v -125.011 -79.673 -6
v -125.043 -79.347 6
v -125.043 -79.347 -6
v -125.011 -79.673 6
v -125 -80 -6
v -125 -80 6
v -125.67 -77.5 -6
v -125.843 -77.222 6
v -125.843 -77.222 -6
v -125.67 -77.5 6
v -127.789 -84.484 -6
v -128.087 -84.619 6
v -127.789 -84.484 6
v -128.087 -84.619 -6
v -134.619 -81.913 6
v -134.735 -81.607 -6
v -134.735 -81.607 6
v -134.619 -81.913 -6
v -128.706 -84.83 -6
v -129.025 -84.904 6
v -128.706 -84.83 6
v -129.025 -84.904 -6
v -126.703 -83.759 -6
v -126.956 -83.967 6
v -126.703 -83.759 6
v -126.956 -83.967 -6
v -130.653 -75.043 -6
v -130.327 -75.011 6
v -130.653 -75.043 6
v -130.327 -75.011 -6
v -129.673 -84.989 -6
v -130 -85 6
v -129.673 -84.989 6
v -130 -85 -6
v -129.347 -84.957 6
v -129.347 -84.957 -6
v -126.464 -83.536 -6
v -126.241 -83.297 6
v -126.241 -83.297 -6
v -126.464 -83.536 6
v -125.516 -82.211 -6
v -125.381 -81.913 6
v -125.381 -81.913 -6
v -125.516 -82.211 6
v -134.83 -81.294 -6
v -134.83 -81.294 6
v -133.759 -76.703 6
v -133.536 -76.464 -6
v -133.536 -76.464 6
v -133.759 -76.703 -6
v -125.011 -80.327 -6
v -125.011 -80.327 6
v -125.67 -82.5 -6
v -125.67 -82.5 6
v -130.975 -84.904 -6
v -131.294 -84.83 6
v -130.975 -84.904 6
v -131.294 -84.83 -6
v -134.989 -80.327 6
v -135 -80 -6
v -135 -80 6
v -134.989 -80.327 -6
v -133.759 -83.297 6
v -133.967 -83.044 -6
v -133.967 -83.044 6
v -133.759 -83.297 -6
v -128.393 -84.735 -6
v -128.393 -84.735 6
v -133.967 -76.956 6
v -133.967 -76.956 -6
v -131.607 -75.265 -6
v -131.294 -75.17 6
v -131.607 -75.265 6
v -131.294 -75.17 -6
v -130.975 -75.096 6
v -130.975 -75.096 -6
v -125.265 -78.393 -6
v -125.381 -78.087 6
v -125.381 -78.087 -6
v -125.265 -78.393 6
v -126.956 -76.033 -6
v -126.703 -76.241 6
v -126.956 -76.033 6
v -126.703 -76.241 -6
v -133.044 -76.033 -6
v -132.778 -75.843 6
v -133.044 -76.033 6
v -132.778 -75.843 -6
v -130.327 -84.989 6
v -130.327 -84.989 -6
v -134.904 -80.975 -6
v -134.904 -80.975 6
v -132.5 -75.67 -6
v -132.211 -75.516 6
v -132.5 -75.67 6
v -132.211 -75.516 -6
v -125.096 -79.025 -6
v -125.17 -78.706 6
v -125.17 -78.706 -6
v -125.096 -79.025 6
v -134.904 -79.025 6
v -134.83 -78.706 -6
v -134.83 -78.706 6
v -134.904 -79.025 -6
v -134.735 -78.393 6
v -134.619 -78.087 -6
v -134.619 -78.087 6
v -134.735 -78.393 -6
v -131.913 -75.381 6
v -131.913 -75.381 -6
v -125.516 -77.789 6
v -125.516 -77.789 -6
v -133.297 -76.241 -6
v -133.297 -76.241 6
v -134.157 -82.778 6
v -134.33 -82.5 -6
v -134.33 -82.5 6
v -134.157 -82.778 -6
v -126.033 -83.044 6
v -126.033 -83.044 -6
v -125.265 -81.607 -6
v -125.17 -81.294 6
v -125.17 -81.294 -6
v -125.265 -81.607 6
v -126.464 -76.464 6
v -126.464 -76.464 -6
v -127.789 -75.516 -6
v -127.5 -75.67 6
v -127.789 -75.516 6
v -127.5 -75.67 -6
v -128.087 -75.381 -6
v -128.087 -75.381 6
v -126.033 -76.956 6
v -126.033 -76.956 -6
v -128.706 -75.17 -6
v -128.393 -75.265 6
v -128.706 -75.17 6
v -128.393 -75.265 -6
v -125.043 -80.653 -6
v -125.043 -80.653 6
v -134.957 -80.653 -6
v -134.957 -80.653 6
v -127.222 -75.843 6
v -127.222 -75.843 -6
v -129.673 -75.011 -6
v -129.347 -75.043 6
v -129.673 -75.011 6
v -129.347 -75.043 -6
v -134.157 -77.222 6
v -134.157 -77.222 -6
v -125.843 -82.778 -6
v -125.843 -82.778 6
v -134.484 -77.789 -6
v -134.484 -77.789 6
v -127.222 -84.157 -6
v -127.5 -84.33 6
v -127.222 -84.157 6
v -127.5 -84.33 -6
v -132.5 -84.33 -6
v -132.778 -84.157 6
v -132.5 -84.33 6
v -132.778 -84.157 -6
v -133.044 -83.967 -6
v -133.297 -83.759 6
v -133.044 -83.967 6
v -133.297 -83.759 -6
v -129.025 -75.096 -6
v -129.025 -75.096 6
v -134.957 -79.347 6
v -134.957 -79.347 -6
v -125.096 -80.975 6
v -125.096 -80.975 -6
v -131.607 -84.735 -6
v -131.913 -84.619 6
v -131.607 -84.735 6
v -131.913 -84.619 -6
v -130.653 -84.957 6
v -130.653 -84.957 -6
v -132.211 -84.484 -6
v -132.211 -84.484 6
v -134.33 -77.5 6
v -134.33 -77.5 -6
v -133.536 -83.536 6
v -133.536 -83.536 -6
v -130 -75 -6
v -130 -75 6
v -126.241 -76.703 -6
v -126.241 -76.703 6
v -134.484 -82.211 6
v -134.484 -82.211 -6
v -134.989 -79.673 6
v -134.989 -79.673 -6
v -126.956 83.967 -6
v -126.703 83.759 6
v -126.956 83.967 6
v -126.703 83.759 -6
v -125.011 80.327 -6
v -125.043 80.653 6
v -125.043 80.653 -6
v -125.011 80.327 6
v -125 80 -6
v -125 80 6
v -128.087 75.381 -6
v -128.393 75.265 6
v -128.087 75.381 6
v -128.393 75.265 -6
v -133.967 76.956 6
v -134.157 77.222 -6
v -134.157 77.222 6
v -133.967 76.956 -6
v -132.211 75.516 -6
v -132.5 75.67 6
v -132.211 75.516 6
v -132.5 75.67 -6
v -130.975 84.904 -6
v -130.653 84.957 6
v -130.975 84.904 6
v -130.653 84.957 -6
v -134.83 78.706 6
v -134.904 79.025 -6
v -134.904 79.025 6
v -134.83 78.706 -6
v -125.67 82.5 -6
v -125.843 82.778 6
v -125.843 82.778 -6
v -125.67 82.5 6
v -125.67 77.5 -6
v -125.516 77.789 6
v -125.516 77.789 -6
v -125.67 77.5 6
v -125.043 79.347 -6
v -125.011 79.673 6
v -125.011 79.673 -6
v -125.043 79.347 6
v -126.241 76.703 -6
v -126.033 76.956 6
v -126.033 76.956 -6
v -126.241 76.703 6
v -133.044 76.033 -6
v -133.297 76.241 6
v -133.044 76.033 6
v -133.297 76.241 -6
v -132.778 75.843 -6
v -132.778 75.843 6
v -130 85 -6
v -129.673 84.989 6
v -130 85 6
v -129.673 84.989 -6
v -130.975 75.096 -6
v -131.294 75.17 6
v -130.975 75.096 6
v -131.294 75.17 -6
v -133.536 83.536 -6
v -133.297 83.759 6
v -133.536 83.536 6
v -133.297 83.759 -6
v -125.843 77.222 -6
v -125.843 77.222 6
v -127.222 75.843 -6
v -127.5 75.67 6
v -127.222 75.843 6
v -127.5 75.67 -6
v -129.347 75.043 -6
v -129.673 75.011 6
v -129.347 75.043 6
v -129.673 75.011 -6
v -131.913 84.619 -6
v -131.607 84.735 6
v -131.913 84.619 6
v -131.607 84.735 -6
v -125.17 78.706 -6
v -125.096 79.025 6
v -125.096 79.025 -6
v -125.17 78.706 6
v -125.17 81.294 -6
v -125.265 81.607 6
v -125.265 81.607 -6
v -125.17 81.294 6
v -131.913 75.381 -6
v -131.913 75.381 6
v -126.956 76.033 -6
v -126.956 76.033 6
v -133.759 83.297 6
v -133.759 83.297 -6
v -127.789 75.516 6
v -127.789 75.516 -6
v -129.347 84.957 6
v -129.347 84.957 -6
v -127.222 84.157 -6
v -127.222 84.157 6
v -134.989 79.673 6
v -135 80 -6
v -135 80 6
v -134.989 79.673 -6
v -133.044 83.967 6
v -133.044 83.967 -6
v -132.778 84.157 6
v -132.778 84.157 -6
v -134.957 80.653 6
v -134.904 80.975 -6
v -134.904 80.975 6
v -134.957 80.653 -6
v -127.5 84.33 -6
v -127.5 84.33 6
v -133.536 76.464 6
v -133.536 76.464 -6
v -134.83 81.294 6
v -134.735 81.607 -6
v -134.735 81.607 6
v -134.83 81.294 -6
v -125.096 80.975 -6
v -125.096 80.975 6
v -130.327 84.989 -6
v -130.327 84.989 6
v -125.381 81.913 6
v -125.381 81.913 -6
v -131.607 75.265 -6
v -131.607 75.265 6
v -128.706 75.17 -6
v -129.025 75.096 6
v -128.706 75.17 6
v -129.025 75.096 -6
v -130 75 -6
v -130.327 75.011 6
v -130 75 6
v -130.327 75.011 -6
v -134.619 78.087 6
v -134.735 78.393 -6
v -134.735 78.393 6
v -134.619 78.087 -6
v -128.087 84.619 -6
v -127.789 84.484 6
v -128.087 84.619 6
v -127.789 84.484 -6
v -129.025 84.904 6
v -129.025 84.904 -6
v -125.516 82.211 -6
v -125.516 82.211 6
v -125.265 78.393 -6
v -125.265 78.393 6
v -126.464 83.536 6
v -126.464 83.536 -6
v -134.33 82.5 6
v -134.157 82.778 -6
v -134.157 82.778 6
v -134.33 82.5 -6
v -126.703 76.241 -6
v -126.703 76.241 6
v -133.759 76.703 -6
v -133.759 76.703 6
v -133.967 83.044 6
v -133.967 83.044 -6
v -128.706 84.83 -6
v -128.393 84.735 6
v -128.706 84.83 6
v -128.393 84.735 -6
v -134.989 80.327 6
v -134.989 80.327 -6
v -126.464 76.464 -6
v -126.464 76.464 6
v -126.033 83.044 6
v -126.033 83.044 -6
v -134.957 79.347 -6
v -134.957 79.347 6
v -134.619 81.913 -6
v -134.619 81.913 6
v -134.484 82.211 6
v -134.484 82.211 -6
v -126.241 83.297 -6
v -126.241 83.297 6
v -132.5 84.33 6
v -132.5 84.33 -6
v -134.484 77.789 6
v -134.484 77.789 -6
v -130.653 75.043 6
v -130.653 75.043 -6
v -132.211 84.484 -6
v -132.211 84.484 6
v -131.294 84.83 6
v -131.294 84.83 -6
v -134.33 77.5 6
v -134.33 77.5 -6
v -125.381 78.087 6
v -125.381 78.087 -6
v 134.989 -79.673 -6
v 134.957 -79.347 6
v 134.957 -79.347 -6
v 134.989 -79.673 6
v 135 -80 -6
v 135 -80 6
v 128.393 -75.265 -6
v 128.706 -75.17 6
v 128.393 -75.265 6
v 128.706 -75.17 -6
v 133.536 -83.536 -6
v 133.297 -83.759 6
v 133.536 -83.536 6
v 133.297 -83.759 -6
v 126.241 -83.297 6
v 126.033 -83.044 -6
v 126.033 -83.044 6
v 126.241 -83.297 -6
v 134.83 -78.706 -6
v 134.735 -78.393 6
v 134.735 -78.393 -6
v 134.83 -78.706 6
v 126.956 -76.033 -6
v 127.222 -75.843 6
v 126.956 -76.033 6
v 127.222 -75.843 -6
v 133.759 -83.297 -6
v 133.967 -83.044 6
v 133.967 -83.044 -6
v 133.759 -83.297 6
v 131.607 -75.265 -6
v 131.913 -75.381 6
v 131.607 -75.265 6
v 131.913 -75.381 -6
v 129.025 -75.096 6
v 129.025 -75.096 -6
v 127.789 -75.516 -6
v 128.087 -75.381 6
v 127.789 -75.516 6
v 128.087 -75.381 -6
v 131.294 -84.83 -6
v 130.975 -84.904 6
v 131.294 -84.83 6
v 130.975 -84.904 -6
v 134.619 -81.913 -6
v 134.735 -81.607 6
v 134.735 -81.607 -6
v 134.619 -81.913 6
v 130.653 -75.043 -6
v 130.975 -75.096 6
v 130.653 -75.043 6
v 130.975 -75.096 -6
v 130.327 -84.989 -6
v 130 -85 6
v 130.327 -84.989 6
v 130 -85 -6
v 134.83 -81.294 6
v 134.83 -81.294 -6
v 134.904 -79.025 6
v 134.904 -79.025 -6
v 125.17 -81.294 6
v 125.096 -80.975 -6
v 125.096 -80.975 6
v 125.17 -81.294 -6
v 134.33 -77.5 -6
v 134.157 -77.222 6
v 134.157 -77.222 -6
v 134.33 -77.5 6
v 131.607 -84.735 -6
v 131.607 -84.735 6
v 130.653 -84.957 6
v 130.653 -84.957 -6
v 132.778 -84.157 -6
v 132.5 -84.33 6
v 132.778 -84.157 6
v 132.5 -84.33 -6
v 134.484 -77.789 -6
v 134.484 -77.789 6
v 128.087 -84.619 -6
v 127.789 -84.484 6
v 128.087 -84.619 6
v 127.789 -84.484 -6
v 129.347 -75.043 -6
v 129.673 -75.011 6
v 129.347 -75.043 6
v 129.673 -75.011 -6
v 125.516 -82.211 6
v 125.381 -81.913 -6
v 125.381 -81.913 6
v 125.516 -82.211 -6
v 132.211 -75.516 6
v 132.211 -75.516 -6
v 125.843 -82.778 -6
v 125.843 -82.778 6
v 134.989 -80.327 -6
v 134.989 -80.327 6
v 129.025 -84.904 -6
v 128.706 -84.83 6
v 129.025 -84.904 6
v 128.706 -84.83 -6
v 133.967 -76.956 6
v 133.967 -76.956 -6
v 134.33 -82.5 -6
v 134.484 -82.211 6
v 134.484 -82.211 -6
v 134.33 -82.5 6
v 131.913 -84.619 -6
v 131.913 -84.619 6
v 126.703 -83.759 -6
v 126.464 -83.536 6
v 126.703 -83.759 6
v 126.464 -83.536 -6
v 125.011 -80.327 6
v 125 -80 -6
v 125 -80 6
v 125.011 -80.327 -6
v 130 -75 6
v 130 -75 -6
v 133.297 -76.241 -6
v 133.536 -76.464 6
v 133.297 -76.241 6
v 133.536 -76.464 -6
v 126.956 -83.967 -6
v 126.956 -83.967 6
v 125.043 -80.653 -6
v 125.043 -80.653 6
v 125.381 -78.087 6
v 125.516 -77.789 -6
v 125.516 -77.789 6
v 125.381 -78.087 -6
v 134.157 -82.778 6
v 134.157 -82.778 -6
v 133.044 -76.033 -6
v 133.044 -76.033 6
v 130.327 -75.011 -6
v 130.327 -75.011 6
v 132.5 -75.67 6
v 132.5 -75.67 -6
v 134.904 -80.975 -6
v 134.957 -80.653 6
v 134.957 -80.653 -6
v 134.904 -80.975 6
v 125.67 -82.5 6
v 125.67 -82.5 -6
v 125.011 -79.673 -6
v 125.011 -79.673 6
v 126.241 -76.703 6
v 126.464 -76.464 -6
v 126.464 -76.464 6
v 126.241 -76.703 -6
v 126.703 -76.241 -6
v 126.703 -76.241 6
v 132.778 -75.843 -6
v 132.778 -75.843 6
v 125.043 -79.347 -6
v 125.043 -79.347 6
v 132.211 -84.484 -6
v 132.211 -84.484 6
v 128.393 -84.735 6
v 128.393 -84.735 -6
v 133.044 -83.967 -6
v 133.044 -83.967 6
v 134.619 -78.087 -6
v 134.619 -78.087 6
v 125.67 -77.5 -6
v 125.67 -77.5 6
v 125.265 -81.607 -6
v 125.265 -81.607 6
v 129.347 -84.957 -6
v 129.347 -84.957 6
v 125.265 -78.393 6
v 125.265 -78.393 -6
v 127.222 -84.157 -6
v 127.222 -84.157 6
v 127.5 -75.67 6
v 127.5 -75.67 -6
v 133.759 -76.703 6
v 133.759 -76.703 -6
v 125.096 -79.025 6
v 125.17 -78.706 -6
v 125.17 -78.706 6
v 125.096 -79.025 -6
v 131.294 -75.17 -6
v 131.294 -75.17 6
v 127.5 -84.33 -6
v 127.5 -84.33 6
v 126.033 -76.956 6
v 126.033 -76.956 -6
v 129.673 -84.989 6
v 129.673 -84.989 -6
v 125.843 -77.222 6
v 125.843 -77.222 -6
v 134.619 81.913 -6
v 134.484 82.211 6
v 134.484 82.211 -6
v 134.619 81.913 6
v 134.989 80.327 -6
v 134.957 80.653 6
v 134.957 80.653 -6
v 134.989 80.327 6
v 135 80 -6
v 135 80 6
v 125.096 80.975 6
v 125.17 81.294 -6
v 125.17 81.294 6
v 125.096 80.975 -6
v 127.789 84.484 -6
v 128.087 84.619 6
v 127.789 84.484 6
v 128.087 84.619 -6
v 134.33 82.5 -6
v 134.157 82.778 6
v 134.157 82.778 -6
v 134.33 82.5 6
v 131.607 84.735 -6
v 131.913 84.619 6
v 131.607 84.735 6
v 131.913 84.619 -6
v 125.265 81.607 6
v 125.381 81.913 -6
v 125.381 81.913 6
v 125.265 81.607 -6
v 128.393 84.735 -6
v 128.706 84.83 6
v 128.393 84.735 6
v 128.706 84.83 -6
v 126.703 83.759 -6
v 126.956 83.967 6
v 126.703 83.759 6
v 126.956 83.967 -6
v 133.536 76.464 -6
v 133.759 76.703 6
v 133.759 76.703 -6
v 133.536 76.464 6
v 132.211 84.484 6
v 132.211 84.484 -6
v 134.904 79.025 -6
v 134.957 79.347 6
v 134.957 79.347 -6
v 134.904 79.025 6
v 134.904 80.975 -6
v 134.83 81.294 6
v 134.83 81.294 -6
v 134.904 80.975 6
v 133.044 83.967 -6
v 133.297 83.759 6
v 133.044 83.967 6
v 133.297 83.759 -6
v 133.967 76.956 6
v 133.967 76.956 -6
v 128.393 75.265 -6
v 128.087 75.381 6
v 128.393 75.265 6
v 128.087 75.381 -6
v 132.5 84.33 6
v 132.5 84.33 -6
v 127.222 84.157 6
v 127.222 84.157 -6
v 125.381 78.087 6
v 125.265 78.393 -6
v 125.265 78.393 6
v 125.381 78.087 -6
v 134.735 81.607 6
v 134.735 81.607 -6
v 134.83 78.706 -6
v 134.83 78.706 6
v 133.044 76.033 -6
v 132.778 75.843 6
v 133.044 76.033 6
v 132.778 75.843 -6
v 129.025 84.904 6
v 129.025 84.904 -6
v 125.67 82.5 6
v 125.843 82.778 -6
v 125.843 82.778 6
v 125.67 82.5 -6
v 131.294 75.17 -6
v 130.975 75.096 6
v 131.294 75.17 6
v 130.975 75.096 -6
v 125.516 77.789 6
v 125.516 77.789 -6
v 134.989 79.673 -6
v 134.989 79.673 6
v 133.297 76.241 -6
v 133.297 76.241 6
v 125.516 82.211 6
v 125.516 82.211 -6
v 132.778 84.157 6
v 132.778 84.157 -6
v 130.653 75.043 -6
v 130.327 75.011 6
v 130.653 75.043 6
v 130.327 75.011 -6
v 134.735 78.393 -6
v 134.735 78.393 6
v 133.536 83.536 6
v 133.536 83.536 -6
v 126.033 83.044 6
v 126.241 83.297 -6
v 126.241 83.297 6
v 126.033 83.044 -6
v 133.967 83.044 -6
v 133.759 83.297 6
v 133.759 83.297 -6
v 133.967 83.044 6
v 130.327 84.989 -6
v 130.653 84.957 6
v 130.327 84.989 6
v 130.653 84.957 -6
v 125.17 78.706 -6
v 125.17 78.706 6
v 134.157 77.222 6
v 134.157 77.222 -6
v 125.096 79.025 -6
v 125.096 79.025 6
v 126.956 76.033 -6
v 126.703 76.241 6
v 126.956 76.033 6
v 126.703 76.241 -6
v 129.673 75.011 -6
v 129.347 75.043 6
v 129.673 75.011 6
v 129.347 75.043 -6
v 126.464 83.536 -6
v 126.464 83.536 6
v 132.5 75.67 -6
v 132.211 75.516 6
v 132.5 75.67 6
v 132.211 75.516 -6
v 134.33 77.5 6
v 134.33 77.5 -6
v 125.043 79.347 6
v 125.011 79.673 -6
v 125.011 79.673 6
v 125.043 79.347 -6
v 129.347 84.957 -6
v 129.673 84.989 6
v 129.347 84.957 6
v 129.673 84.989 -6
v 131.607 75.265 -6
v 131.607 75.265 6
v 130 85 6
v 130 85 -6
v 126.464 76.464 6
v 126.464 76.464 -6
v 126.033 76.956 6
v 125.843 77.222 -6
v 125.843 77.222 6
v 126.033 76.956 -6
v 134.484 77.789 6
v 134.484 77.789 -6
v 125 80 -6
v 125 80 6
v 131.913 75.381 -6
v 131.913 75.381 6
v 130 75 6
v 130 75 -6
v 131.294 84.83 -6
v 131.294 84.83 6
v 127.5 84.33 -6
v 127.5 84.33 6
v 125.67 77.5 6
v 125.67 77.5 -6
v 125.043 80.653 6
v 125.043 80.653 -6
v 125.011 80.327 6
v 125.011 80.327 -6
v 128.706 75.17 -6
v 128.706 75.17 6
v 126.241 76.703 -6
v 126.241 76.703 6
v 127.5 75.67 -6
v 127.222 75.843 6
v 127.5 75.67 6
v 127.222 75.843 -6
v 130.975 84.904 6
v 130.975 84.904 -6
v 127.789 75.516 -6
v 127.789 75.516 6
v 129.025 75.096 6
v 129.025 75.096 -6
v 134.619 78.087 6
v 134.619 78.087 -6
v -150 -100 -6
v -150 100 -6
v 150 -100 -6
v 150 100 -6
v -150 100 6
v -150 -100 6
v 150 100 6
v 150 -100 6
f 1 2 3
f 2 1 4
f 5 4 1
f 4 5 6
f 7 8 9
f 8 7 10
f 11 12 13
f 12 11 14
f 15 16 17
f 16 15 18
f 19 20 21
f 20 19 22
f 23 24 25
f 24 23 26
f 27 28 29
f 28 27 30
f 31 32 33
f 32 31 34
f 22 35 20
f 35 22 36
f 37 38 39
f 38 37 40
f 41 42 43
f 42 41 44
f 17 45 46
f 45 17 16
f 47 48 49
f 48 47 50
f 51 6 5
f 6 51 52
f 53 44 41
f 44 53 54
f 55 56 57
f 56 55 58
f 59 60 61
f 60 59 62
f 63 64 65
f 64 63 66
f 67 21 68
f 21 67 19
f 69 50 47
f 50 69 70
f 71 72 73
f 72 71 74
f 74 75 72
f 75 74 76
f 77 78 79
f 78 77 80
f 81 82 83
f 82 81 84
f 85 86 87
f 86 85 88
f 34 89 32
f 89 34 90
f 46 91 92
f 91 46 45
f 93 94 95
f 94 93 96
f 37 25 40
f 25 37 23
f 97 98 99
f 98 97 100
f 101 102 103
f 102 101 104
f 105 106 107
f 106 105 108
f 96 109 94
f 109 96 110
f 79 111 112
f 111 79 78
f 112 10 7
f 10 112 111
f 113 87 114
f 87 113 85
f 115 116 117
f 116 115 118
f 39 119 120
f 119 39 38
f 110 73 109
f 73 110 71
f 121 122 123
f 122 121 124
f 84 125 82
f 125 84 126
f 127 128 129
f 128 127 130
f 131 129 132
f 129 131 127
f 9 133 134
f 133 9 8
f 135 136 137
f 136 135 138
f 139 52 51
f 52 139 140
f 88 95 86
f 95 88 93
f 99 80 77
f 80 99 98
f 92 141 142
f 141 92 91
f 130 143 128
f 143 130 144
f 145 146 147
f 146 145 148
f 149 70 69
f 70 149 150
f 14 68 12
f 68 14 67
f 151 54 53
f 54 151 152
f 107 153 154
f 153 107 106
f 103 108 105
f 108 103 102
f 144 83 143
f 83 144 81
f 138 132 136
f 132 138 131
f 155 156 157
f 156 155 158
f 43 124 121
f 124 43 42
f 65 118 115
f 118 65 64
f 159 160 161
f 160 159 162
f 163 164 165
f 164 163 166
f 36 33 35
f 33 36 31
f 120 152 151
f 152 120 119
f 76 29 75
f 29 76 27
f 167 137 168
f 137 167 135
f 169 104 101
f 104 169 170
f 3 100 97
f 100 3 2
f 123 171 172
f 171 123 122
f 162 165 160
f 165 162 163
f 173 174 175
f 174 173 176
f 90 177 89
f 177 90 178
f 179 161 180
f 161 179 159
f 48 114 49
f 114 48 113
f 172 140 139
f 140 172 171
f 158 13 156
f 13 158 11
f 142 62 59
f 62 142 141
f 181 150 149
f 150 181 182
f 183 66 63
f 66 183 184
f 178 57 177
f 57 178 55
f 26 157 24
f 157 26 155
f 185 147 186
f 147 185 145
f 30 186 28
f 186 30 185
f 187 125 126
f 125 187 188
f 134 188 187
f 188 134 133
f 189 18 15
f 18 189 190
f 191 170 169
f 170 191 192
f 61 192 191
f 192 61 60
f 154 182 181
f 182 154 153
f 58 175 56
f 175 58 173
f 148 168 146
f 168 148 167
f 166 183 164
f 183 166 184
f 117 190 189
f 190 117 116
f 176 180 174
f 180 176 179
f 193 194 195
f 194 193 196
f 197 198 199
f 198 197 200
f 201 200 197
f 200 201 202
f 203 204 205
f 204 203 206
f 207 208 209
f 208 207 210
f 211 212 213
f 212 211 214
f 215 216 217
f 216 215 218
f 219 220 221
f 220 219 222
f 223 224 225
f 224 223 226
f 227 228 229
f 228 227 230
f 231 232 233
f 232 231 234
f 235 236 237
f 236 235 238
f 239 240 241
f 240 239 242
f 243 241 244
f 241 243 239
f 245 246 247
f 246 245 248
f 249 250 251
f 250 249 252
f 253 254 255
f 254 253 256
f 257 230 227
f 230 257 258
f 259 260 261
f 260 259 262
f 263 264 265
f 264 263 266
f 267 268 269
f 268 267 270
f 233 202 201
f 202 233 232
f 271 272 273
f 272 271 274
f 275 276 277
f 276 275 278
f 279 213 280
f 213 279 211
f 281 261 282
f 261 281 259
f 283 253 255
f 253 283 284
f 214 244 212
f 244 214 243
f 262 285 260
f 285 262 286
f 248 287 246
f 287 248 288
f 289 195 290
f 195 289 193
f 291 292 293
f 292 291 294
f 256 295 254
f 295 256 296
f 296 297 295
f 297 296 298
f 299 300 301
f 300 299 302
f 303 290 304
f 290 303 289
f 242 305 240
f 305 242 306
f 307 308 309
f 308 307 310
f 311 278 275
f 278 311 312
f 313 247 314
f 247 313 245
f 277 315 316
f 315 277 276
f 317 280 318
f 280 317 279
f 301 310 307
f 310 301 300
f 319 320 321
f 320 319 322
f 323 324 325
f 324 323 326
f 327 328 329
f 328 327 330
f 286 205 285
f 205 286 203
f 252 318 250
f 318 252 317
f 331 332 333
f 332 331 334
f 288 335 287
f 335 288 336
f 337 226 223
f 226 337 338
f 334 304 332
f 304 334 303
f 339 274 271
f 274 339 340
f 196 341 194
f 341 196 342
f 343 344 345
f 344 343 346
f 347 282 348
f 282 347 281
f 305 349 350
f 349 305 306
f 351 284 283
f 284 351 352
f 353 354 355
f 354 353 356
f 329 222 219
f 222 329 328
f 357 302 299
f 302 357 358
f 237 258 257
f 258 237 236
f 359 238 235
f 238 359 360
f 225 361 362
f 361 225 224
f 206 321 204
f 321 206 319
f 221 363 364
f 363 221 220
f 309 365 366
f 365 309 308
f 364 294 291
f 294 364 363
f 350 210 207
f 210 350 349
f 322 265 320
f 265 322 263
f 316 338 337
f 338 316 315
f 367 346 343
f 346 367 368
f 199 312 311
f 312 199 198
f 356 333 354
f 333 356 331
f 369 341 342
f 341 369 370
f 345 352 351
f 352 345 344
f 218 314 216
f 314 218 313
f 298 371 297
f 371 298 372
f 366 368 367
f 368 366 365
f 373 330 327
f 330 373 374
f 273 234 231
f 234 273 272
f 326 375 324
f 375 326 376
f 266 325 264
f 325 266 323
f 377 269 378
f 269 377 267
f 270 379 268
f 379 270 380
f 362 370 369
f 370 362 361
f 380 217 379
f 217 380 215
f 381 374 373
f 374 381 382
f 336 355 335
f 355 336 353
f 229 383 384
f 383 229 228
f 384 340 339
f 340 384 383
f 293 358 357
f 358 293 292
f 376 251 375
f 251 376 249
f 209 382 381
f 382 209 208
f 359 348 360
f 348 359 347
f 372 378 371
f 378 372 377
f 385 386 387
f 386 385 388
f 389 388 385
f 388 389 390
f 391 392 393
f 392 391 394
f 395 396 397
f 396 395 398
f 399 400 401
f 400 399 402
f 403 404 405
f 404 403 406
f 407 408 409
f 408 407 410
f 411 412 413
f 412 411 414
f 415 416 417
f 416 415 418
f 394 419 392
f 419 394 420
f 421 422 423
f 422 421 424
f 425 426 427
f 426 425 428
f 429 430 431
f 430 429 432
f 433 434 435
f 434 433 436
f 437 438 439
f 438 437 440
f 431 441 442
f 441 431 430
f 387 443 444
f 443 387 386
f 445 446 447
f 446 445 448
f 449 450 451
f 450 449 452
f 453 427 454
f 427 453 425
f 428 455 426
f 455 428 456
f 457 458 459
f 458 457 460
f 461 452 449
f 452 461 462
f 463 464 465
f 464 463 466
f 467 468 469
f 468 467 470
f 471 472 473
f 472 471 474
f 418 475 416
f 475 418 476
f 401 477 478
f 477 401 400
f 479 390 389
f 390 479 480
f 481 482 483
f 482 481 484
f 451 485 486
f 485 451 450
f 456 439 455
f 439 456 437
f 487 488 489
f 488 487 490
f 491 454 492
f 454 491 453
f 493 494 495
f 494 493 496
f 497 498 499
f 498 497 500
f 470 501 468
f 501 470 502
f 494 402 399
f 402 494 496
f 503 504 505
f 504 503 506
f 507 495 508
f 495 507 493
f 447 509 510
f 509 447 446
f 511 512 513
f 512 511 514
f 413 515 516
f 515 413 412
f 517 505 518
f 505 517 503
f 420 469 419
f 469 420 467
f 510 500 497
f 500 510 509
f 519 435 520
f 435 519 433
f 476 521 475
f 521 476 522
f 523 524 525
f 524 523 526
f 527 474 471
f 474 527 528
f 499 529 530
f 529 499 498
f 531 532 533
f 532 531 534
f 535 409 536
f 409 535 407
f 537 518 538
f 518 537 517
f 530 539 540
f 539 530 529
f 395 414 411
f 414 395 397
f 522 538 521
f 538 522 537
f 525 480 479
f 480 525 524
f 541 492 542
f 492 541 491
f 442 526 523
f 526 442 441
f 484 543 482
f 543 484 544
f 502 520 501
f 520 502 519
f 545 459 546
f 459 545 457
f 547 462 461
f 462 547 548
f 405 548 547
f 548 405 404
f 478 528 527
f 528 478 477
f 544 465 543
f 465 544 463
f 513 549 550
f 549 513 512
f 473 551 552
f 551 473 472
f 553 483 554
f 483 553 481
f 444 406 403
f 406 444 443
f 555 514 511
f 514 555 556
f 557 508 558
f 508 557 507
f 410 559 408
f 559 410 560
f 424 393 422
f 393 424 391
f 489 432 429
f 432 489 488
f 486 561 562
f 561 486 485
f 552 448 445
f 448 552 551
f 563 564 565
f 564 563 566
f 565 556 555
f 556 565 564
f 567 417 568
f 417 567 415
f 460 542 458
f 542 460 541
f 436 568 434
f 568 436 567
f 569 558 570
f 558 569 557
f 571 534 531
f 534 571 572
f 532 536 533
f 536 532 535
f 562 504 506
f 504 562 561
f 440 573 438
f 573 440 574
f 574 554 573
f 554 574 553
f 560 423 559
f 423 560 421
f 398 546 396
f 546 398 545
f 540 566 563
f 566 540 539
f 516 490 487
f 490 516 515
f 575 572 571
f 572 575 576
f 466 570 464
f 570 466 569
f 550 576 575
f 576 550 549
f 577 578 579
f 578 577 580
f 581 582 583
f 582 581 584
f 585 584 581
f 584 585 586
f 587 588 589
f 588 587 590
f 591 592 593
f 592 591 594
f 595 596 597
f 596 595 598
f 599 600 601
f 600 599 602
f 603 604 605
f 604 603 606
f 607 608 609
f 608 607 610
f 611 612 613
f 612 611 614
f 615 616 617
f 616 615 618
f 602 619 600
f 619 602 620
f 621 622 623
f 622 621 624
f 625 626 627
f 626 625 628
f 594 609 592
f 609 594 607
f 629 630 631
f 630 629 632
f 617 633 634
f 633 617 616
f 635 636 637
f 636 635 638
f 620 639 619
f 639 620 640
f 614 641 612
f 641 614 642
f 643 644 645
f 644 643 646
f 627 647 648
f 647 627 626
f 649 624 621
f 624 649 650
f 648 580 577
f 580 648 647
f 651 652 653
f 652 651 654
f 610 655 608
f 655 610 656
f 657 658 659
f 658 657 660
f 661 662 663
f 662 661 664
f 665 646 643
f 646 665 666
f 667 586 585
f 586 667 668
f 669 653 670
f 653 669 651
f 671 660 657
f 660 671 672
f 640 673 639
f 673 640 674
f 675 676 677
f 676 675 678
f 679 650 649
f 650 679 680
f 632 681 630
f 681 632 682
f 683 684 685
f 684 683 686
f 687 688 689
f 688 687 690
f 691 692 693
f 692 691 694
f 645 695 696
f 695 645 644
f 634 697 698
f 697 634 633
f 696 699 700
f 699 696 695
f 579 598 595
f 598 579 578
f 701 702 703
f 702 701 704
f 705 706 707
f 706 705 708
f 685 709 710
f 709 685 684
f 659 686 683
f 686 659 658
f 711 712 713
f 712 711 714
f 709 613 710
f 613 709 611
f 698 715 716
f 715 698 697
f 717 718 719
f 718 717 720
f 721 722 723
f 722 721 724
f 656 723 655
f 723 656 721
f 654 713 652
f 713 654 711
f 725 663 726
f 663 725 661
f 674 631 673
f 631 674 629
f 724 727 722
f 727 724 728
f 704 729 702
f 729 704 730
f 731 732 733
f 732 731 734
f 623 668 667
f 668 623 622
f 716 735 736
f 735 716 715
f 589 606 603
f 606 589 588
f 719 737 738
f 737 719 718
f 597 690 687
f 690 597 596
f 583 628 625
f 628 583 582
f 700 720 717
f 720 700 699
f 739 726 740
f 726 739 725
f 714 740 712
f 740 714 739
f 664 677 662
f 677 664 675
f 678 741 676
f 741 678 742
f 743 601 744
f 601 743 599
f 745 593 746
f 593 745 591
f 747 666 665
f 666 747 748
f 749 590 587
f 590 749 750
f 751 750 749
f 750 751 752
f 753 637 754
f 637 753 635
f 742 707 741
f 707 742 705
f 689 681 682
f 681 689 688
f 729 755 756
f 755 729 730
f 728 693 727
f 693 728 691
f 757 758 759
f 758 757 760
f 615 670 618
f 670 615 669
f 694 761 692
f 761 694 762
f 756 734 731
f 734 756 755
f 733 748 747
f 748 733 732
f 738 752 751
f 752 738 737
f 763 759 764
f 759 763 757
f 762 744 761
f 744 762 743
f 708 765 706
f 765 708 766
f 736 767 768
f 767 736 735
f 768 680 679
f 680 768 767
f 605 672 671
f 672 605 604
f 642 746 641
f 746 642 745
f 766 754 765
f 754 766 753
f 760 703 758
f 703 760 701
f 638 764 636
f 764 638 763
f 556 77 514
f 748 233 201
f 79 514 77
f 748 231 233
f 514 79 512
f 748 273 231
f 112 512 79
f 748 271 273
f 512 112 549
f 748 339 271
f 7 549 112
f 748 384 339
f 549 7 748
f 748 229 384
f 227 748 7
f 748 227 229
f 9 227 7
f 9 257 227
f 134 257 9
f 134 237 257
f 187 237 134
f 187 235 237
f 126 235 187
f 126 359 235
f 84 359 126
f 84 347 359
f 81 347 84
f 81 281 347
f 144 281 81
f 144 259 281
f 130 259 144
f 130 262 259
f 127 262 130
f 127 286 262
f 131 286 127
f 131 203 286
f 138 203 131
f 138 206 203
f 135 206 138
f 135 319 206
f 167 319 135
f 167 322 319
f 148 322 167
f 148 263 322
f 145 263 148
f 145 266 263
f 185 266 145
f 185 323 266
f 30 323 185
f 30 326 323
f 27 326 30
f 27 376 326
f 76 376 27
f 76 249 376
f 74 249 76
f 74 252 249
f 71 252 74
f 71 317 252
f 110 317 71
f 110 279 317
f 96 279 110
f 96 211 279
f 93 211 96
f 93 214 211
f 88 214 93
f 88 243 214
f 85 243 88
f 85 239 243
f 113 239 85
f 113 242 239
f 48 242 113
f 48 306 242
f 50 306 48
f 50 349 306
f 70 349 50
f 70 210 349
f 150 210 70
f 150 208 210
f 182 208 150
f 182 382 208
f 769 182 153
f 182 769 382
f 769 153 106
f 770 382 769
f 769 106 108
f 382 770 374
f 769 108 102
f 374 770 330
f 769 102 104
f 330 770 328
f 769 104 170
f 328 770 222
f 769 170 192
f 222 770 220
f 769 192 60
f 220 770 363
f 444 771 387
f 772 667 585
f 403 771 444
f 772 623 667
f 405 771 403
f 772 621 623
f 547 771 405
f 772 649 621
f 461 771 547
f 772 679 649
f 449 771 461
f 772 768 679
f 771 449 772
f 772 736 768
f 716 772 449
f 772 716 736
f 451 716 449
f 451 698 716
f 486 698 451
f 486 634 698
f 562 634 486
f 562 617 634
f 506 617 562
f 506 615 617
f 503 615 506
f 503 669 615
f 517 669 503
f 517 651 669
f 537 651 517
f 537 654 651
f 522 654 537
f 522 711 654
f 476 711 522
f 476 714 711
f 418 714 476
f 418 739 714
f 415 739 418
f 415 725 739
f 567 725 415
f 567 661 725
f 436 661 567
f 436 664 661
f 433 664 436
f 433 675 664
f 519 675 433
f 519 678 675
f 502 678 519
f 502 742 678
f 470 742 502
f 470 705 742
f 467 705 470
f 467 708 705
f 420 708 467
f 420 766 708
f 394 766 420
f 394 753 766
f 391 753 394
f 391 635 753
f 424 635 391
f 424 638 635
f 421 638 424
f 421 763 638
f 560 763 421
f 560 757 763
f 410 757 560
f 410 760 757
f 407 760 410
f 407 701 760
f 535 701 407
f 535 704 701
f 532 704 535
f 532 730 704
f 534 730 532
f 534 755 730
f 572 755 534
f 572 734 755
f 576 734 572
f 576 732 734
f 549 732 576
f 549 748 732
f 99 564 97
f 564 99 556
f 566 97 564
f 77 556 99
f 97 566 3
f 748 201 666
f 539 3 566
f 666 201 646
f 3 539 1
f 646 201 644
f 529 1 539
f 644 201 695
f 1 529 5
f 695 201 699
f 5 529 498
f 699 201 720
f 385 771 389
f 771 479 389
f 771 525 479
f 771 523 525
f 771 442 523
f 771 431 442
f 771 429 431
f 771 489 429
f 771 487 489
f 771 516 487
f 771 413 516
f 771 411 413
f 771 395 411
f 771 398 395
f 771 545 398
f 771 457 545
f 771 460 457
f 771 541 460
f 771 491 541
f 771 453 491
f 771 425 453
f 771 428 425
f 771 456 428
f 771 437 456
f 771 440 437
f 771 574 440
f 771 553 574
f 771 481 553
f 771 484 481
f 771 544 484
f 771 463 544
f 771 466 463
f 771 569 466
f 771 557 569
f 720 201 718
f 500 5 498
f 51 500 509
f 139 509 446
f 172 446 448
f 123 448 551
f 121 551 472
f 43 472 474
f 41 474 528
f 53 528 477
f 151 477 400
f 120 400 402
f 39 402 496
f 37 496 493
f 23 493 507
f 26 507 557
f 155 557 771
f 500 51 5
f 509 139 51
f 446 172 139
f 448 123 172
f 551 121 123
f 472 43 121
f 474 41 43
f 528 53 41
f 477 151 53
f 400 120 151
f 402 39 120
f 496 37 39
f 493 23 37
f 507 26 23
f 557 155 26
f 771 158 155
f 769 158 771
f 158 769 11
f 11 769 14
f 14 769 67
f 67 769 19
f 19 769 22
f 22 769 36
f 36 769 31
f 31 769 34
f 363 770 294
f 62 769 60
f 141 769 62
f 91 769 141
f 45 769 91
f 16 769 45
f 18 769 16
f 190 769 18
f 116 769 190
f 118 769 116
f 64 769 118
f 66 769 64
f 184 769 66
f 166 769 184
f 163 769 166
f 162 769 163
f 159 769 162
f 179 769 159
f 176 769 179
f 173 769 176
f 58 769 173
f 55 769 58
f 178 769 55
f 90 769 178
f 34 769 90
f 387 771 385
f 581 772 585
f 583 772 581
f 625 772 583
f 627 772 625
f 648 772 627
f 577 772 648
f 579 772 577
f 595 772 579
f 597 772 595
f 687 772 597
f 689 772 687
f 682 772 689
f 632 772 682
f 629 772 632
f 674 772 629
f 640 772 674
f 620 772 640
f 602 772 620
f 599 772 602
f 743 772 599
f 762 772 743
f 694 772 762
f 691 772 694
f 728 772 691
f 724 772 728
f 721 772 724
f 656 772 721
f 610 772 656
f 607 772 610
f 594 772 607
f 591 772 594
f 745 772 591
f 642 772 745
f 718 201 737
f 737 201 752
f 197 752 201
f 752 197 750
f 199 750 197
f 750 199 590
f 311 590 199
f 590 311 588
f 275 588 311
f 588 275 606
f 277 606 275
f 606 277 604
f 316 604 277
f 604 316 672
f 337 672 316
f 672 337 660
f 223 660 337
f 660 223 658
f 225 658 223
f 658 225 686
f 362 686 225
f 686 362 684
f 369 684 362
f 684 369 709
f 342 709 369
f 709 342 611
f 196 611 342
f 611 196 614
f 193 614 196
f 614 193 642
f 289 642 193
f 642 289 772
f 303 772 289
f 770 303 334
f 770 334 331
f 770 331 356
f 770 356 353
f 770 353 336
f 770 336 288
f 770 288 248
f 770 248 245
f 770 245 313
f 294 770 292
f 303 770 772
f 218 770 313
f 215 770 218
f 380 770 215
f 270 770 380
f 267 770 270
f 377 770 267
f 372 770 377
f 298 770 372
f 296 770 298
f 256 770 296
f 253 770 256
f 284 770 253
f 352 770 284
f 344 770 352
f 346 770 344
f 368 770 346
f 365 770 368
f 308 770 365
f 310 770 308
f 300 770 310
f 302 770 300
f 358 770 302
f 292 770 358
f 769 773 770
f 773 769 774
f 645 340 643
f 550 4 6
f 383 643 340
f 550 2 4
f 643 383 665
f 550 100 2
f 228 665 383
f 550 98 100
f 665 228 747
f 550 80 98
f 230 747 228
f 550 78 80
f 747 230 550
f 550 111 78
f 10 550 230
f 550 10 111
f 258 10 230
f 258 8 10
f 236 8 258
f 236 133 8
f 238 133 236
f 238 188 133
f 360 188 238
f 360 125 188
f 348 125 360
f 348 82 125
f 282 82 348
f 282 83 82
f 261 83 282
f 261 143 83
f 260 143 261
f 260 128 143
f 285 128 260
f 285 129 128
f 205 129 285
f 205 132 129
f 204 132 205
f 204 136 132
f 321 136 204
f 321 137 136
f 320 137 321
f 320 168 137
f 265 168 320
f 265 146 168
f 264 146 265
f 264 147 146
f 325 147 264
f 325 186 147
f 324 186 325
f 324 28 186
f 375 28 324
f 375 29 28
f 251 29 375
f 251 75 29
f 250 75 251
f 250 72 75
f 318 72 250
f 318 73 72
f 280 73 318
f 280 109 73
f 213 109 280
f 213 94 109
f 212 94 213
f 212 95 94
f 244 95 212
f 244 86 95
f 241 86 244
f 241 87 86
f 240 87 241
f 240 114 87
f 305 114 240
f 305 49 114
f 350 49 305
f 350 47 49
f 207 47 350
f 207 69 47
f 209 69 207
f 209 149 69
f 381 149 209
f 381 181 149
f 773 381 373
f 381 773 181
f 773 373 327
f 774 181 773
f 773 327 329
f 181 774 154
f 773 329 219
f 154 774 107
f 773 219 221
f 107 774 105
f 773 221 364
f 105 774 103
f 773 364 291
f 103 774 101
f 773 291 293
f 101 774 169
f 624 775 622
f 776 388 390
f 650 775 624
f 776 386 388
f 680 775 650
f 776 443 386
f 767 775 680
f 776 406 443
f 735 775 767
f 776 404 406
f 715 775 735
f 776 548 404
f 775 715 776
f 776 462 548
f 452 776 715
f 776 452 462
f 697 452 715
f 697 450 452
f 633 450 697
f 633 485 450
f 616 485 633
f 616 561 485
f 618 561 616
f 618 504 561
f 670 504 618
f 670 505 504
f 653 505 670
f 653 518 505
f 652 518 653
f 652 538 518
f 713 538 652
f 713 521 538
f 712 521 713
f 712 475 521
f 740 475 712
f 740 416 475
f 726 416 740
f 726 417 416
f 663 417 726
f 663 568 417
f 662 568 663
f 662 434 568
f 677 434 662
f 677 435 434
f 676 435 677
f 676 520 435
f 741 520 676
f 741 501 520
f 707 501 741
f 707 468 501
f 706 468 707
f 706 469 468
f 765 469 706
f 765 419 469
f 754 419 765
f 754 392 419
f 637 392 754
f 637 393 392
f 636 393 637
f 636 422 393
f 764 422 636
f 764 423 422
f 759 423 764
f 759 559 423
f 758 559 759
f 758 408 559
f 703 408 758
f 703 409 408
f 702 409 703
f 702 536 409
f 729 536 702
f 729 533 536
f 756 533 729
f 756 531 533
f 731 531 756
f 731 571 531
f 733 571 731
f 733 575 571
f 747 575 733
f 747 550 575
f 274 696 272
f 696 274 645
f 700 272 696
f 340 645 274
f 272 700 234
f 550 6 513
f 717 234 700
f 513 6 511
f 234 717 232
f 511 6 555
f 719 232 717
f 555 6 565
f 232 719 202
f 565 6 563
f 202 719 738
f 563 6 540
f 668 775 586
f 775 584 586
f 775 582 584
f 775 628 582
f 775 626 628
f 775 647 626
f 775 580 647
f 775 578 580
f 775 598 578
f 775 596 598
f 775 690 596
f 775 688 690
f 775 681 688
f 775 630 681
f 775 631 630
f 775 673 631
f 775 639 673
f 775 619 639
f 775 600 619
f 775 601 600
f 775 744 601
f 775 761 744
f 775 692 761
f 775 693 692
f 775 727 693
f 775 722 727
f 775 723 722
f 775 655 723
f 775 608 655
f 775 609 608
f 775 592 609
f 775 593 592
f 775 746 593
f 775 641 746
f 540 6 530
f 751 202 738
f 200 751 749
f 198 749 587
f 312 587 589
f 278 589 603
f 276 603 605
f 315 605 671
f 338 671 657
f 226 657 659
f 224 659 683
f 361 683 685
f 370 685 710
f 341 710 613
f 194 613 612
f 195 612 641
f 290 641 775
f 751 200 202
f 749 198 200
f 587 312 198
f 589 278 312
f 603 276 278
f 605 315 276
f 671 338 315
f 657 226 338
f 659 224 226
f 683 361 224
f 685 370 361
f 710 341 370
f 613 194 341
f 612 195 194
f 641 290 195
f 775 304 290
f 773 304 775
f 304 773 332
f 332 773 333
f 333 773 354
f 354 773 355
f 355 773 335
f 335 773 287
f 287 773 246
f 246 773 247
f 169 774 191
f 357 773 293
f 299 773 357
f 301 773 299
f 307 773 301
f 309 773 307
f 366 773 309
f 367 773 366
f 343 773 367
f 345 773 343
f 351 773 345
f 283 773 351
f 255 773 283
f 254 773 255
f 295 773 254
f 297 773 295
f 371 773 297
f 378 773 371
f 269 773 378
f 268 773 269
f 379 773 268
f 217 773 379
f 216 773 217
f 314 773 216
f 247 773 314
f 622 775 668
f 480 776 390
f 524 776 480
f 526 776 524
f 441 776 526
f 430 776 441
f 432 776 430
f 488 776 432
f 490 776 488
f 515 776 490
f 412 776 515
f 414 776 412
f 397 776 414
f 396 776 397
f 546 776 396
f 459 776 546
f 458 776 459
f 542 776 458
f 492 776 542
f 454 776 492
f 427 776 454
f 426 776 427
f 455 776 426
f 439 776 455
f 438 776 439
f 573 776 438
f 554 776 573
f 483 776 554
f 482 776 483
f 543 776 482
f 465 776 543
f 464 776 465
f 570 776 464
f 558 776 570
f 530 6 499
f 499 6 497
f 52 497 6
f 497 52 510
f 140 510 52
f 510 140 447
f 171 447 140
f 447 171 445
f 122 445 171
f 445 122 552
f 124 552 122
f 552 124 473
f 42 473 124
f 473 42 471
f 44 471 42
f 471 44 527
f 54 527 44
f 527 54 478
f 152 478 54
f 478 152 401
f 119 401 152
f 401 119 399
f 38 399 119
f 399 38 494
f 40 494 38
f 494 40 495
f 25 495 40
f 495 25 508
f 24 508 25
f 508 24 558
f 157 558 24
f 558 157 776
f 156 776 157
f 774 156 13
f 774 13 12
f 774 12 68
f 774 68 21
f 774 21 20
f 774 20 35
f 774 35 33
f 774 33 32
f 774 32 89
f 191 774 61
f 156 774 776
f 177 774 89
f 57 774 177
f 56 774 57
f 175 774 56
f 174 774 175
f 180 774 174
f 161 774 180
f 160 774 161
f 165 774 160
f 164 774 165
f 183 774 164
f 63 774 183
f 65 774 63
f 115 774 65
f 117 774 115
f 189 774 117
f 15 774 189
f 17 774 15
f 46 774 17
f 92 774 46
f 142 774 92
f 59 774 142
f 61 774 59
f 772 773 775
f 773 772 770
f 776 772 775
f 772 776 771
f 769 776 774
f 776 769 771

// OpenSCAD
// Aluminium tooling plate (single connected solid with through mounting holes)

// Parameters
plate_L = 300; //[150:600:1]
plate_W = 200; //[100:400:1]
plate_T = 12;  //[6:24:1]

edge_margin = 20;     //[10:40:1]
mount_hole_d = 10;    //[5:20:1]

corner_fillet_r = 0;  //[0:10:1]
edge_chamfer = 0;     //[0:3:0.5]

connect_overlap = 1;  //[0.5:2:0.5]
$fn = 96;

// Helpers
function clamp(v, lo, hi) = v < lo ? lo : (v > hi ? hi : v);

// Keep features valid for given plate size
fillet_r = clamp(corner_fillet_r, 0, min(plate_L, plate_W)/2 - 0.01);
chamfer  = clamp(edge_chamfer, 0, min(plate_L, plate_W)/2 - 0.01);

// 2D rounded rectangle for robust, non-blank rendering
module rounded_rect_2d(L, W, r) {
    if (r <= 0) {
        square([L, W], center=true);
    } else {
        hull() {
            for (sx = [-1, 1], sy = [-1, 1])
                translate([sx*(L/2 - r), sy*(W/2 - r)]) circle(r=r);
        }
    }
}

// Base plate (optionally filleted corners)
module plate_body() {
    linear_extrude(height=plate_T, center=true, convexity=10)
        rounded_rect_2d(plate_L, plate_W, fillet_r);
}

// Optional edge chamfer (top & bottom) while keeping one connected solid
module plate_with_optional_chamfer() {
    if (chamfer <= 0) {
        plate_body();
    } else {
        // Create a simple 45°-ish chamfer by hulling a slightly smaller top/bottom profile
        hull() {
            translate([0, 0, -plate_T/2])
                linear_extrude(height=connect_overlap, center=false, convexity=10)
                    rounded_rect_2d(plate_L, plate_W, fillet_r);

            translate([0, 0, -plate_T/2 + chamfer])
                linear_extrude(height=plate_T - 2*chamfer, center=false, convexity=10)
                    rounded_rect_2d(plate_L - 2*chamfer, plate_W - 2*chamfer, max(fillet_r - chamfer, 0));

            translate([0, 0, plate_T/2 - connect_overlap])
                linear_extrude(height=connect_overlap, center=false, convexity=10)
                    rounded_rect_2d(plate_L, plate_W, fillet_r);
        }
    }
}

// Through holes (subtractive)
module mounting_holes() {
    hole_h = plate_T + 2*connect_overlap; // guaranteed to cut through
    for (sx = [-1, 1], sy = [-1, 1]) {
        translate([sx*(plate_L/2 - edge_margin), sy*(plate_W/2 - edge_margin), 0])
            cylinder(d=mount_hole_d, h=hole_h, center=true);
    }
}

// Final model: ONE connected solid
difference() {
    plate_with_optional_chamfer();
    mounting_holes();
}
